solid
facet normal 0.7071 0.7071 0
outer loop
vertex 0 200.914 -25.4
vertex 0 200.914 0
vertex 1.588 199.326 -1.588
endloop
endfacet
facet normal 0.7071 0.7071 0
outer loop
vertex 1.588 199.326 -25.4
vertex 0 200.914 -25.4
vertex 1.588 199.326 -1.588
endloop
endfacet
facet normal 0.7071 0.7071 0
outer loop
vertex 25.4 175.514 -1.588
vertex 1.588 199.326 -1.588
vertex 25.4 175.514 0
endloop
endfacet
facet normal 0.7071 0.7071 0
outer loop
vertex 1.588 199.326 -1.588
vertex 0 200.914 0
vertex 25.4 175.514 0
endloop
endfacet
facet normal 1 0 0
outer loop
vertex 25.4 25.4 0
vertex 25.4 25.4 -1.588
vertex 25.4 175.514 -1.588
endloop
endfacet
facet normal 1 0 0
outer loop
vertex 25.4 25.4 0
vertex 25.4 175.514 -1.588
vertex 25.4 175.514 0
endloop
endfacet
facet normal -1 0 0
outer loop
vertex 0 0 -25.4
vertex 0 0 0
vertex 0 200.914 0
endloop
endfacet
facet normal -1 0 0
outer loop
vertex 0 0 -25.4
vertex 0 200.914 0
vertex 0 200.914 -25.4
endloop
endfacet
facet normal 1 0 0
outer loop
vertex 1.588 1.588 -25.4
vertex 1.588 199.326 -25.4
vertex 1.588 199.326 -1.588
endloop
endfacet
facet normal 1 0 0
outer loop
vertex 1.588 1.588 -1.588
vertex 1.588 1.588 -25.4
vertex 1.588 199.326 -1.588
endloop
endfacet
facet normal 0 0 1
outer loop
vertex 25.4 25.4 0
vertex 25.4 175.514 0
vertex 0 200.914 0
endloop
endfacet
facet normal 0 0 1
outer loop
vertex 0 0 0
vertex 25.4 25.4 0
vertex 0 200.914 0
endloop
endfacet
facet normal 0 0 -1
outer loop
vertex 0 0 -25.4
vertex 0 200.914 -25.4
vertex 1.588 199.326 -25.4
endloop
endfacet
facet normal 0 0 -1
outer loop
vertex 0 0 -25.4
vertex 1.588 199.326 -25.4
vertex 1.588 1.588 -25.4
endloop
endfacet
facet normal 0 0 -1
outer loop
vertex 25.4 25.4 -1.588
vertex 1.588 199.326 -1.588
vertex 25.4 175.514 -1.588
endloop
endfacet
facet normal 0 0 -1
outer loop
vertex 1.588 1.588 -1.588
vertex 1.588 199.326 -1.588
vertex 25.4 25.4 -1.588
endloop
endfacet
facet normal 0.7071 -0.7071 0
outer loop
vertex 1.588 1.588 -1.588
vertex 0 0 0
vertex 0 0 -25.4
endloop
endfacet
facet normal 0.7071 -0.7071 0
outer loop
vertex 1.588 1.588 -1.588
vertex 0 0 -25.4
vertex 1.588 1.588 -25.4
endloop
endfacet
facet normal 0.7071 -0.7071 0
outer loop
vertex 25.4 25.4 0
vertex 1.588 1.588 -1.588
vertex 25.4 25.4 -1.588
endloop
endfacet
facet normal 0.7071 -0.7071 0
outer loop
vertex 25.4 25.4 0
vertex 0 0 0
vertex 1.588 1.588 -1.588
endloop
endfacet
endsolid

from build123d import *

# Parameters (mm, degrees)
BOSS_EXTRUDE2_DEPTH = 200.914
CUT_EXTRUDE1_DEPTH  = 26.4
CUT_EXTRUDE2_DEPTH  = 26.4


with BuildPart() as part:
    # Sketch2 → Boss-Extrude2 (new body)
    with BuildSketch(Plane(origin=(0, 0, 0), x_dir=(1, 0, 0), z_dir=(0, 1, 0))):
        Polygon((0, 0), (0, 25.4), (1.5875, 25.4), (1.5875, 1.5875), (25.4, 1.5875), (25.4, 0), align=None)
    extrude(amount=BOSS_EXTRUDE2_DEPTH)

    # Sketch4 → Cut-Extrude1 (cut, through all)
    with BuildSketch(Plane.XY):
        Polygon((0, 200.914), (25.4, 175.514), (25.4, 200.914), align=None)
    extrude(amount=-CUT_EXTRUDE1_DEPTH, mode=Mode.SUBTRACT)

    # Sketch5 → Cut-Extrude2 (cut, through all)
    with BuildSketch(Plane.XY):
        Polygon((0, 0), (25.4, 25.4), (25.4, 0), align=None)
    extrude(amount=-CUT_EXTRUDE2_DEPTH, mode=Mode.SUBTRACT)


solid = part.part
